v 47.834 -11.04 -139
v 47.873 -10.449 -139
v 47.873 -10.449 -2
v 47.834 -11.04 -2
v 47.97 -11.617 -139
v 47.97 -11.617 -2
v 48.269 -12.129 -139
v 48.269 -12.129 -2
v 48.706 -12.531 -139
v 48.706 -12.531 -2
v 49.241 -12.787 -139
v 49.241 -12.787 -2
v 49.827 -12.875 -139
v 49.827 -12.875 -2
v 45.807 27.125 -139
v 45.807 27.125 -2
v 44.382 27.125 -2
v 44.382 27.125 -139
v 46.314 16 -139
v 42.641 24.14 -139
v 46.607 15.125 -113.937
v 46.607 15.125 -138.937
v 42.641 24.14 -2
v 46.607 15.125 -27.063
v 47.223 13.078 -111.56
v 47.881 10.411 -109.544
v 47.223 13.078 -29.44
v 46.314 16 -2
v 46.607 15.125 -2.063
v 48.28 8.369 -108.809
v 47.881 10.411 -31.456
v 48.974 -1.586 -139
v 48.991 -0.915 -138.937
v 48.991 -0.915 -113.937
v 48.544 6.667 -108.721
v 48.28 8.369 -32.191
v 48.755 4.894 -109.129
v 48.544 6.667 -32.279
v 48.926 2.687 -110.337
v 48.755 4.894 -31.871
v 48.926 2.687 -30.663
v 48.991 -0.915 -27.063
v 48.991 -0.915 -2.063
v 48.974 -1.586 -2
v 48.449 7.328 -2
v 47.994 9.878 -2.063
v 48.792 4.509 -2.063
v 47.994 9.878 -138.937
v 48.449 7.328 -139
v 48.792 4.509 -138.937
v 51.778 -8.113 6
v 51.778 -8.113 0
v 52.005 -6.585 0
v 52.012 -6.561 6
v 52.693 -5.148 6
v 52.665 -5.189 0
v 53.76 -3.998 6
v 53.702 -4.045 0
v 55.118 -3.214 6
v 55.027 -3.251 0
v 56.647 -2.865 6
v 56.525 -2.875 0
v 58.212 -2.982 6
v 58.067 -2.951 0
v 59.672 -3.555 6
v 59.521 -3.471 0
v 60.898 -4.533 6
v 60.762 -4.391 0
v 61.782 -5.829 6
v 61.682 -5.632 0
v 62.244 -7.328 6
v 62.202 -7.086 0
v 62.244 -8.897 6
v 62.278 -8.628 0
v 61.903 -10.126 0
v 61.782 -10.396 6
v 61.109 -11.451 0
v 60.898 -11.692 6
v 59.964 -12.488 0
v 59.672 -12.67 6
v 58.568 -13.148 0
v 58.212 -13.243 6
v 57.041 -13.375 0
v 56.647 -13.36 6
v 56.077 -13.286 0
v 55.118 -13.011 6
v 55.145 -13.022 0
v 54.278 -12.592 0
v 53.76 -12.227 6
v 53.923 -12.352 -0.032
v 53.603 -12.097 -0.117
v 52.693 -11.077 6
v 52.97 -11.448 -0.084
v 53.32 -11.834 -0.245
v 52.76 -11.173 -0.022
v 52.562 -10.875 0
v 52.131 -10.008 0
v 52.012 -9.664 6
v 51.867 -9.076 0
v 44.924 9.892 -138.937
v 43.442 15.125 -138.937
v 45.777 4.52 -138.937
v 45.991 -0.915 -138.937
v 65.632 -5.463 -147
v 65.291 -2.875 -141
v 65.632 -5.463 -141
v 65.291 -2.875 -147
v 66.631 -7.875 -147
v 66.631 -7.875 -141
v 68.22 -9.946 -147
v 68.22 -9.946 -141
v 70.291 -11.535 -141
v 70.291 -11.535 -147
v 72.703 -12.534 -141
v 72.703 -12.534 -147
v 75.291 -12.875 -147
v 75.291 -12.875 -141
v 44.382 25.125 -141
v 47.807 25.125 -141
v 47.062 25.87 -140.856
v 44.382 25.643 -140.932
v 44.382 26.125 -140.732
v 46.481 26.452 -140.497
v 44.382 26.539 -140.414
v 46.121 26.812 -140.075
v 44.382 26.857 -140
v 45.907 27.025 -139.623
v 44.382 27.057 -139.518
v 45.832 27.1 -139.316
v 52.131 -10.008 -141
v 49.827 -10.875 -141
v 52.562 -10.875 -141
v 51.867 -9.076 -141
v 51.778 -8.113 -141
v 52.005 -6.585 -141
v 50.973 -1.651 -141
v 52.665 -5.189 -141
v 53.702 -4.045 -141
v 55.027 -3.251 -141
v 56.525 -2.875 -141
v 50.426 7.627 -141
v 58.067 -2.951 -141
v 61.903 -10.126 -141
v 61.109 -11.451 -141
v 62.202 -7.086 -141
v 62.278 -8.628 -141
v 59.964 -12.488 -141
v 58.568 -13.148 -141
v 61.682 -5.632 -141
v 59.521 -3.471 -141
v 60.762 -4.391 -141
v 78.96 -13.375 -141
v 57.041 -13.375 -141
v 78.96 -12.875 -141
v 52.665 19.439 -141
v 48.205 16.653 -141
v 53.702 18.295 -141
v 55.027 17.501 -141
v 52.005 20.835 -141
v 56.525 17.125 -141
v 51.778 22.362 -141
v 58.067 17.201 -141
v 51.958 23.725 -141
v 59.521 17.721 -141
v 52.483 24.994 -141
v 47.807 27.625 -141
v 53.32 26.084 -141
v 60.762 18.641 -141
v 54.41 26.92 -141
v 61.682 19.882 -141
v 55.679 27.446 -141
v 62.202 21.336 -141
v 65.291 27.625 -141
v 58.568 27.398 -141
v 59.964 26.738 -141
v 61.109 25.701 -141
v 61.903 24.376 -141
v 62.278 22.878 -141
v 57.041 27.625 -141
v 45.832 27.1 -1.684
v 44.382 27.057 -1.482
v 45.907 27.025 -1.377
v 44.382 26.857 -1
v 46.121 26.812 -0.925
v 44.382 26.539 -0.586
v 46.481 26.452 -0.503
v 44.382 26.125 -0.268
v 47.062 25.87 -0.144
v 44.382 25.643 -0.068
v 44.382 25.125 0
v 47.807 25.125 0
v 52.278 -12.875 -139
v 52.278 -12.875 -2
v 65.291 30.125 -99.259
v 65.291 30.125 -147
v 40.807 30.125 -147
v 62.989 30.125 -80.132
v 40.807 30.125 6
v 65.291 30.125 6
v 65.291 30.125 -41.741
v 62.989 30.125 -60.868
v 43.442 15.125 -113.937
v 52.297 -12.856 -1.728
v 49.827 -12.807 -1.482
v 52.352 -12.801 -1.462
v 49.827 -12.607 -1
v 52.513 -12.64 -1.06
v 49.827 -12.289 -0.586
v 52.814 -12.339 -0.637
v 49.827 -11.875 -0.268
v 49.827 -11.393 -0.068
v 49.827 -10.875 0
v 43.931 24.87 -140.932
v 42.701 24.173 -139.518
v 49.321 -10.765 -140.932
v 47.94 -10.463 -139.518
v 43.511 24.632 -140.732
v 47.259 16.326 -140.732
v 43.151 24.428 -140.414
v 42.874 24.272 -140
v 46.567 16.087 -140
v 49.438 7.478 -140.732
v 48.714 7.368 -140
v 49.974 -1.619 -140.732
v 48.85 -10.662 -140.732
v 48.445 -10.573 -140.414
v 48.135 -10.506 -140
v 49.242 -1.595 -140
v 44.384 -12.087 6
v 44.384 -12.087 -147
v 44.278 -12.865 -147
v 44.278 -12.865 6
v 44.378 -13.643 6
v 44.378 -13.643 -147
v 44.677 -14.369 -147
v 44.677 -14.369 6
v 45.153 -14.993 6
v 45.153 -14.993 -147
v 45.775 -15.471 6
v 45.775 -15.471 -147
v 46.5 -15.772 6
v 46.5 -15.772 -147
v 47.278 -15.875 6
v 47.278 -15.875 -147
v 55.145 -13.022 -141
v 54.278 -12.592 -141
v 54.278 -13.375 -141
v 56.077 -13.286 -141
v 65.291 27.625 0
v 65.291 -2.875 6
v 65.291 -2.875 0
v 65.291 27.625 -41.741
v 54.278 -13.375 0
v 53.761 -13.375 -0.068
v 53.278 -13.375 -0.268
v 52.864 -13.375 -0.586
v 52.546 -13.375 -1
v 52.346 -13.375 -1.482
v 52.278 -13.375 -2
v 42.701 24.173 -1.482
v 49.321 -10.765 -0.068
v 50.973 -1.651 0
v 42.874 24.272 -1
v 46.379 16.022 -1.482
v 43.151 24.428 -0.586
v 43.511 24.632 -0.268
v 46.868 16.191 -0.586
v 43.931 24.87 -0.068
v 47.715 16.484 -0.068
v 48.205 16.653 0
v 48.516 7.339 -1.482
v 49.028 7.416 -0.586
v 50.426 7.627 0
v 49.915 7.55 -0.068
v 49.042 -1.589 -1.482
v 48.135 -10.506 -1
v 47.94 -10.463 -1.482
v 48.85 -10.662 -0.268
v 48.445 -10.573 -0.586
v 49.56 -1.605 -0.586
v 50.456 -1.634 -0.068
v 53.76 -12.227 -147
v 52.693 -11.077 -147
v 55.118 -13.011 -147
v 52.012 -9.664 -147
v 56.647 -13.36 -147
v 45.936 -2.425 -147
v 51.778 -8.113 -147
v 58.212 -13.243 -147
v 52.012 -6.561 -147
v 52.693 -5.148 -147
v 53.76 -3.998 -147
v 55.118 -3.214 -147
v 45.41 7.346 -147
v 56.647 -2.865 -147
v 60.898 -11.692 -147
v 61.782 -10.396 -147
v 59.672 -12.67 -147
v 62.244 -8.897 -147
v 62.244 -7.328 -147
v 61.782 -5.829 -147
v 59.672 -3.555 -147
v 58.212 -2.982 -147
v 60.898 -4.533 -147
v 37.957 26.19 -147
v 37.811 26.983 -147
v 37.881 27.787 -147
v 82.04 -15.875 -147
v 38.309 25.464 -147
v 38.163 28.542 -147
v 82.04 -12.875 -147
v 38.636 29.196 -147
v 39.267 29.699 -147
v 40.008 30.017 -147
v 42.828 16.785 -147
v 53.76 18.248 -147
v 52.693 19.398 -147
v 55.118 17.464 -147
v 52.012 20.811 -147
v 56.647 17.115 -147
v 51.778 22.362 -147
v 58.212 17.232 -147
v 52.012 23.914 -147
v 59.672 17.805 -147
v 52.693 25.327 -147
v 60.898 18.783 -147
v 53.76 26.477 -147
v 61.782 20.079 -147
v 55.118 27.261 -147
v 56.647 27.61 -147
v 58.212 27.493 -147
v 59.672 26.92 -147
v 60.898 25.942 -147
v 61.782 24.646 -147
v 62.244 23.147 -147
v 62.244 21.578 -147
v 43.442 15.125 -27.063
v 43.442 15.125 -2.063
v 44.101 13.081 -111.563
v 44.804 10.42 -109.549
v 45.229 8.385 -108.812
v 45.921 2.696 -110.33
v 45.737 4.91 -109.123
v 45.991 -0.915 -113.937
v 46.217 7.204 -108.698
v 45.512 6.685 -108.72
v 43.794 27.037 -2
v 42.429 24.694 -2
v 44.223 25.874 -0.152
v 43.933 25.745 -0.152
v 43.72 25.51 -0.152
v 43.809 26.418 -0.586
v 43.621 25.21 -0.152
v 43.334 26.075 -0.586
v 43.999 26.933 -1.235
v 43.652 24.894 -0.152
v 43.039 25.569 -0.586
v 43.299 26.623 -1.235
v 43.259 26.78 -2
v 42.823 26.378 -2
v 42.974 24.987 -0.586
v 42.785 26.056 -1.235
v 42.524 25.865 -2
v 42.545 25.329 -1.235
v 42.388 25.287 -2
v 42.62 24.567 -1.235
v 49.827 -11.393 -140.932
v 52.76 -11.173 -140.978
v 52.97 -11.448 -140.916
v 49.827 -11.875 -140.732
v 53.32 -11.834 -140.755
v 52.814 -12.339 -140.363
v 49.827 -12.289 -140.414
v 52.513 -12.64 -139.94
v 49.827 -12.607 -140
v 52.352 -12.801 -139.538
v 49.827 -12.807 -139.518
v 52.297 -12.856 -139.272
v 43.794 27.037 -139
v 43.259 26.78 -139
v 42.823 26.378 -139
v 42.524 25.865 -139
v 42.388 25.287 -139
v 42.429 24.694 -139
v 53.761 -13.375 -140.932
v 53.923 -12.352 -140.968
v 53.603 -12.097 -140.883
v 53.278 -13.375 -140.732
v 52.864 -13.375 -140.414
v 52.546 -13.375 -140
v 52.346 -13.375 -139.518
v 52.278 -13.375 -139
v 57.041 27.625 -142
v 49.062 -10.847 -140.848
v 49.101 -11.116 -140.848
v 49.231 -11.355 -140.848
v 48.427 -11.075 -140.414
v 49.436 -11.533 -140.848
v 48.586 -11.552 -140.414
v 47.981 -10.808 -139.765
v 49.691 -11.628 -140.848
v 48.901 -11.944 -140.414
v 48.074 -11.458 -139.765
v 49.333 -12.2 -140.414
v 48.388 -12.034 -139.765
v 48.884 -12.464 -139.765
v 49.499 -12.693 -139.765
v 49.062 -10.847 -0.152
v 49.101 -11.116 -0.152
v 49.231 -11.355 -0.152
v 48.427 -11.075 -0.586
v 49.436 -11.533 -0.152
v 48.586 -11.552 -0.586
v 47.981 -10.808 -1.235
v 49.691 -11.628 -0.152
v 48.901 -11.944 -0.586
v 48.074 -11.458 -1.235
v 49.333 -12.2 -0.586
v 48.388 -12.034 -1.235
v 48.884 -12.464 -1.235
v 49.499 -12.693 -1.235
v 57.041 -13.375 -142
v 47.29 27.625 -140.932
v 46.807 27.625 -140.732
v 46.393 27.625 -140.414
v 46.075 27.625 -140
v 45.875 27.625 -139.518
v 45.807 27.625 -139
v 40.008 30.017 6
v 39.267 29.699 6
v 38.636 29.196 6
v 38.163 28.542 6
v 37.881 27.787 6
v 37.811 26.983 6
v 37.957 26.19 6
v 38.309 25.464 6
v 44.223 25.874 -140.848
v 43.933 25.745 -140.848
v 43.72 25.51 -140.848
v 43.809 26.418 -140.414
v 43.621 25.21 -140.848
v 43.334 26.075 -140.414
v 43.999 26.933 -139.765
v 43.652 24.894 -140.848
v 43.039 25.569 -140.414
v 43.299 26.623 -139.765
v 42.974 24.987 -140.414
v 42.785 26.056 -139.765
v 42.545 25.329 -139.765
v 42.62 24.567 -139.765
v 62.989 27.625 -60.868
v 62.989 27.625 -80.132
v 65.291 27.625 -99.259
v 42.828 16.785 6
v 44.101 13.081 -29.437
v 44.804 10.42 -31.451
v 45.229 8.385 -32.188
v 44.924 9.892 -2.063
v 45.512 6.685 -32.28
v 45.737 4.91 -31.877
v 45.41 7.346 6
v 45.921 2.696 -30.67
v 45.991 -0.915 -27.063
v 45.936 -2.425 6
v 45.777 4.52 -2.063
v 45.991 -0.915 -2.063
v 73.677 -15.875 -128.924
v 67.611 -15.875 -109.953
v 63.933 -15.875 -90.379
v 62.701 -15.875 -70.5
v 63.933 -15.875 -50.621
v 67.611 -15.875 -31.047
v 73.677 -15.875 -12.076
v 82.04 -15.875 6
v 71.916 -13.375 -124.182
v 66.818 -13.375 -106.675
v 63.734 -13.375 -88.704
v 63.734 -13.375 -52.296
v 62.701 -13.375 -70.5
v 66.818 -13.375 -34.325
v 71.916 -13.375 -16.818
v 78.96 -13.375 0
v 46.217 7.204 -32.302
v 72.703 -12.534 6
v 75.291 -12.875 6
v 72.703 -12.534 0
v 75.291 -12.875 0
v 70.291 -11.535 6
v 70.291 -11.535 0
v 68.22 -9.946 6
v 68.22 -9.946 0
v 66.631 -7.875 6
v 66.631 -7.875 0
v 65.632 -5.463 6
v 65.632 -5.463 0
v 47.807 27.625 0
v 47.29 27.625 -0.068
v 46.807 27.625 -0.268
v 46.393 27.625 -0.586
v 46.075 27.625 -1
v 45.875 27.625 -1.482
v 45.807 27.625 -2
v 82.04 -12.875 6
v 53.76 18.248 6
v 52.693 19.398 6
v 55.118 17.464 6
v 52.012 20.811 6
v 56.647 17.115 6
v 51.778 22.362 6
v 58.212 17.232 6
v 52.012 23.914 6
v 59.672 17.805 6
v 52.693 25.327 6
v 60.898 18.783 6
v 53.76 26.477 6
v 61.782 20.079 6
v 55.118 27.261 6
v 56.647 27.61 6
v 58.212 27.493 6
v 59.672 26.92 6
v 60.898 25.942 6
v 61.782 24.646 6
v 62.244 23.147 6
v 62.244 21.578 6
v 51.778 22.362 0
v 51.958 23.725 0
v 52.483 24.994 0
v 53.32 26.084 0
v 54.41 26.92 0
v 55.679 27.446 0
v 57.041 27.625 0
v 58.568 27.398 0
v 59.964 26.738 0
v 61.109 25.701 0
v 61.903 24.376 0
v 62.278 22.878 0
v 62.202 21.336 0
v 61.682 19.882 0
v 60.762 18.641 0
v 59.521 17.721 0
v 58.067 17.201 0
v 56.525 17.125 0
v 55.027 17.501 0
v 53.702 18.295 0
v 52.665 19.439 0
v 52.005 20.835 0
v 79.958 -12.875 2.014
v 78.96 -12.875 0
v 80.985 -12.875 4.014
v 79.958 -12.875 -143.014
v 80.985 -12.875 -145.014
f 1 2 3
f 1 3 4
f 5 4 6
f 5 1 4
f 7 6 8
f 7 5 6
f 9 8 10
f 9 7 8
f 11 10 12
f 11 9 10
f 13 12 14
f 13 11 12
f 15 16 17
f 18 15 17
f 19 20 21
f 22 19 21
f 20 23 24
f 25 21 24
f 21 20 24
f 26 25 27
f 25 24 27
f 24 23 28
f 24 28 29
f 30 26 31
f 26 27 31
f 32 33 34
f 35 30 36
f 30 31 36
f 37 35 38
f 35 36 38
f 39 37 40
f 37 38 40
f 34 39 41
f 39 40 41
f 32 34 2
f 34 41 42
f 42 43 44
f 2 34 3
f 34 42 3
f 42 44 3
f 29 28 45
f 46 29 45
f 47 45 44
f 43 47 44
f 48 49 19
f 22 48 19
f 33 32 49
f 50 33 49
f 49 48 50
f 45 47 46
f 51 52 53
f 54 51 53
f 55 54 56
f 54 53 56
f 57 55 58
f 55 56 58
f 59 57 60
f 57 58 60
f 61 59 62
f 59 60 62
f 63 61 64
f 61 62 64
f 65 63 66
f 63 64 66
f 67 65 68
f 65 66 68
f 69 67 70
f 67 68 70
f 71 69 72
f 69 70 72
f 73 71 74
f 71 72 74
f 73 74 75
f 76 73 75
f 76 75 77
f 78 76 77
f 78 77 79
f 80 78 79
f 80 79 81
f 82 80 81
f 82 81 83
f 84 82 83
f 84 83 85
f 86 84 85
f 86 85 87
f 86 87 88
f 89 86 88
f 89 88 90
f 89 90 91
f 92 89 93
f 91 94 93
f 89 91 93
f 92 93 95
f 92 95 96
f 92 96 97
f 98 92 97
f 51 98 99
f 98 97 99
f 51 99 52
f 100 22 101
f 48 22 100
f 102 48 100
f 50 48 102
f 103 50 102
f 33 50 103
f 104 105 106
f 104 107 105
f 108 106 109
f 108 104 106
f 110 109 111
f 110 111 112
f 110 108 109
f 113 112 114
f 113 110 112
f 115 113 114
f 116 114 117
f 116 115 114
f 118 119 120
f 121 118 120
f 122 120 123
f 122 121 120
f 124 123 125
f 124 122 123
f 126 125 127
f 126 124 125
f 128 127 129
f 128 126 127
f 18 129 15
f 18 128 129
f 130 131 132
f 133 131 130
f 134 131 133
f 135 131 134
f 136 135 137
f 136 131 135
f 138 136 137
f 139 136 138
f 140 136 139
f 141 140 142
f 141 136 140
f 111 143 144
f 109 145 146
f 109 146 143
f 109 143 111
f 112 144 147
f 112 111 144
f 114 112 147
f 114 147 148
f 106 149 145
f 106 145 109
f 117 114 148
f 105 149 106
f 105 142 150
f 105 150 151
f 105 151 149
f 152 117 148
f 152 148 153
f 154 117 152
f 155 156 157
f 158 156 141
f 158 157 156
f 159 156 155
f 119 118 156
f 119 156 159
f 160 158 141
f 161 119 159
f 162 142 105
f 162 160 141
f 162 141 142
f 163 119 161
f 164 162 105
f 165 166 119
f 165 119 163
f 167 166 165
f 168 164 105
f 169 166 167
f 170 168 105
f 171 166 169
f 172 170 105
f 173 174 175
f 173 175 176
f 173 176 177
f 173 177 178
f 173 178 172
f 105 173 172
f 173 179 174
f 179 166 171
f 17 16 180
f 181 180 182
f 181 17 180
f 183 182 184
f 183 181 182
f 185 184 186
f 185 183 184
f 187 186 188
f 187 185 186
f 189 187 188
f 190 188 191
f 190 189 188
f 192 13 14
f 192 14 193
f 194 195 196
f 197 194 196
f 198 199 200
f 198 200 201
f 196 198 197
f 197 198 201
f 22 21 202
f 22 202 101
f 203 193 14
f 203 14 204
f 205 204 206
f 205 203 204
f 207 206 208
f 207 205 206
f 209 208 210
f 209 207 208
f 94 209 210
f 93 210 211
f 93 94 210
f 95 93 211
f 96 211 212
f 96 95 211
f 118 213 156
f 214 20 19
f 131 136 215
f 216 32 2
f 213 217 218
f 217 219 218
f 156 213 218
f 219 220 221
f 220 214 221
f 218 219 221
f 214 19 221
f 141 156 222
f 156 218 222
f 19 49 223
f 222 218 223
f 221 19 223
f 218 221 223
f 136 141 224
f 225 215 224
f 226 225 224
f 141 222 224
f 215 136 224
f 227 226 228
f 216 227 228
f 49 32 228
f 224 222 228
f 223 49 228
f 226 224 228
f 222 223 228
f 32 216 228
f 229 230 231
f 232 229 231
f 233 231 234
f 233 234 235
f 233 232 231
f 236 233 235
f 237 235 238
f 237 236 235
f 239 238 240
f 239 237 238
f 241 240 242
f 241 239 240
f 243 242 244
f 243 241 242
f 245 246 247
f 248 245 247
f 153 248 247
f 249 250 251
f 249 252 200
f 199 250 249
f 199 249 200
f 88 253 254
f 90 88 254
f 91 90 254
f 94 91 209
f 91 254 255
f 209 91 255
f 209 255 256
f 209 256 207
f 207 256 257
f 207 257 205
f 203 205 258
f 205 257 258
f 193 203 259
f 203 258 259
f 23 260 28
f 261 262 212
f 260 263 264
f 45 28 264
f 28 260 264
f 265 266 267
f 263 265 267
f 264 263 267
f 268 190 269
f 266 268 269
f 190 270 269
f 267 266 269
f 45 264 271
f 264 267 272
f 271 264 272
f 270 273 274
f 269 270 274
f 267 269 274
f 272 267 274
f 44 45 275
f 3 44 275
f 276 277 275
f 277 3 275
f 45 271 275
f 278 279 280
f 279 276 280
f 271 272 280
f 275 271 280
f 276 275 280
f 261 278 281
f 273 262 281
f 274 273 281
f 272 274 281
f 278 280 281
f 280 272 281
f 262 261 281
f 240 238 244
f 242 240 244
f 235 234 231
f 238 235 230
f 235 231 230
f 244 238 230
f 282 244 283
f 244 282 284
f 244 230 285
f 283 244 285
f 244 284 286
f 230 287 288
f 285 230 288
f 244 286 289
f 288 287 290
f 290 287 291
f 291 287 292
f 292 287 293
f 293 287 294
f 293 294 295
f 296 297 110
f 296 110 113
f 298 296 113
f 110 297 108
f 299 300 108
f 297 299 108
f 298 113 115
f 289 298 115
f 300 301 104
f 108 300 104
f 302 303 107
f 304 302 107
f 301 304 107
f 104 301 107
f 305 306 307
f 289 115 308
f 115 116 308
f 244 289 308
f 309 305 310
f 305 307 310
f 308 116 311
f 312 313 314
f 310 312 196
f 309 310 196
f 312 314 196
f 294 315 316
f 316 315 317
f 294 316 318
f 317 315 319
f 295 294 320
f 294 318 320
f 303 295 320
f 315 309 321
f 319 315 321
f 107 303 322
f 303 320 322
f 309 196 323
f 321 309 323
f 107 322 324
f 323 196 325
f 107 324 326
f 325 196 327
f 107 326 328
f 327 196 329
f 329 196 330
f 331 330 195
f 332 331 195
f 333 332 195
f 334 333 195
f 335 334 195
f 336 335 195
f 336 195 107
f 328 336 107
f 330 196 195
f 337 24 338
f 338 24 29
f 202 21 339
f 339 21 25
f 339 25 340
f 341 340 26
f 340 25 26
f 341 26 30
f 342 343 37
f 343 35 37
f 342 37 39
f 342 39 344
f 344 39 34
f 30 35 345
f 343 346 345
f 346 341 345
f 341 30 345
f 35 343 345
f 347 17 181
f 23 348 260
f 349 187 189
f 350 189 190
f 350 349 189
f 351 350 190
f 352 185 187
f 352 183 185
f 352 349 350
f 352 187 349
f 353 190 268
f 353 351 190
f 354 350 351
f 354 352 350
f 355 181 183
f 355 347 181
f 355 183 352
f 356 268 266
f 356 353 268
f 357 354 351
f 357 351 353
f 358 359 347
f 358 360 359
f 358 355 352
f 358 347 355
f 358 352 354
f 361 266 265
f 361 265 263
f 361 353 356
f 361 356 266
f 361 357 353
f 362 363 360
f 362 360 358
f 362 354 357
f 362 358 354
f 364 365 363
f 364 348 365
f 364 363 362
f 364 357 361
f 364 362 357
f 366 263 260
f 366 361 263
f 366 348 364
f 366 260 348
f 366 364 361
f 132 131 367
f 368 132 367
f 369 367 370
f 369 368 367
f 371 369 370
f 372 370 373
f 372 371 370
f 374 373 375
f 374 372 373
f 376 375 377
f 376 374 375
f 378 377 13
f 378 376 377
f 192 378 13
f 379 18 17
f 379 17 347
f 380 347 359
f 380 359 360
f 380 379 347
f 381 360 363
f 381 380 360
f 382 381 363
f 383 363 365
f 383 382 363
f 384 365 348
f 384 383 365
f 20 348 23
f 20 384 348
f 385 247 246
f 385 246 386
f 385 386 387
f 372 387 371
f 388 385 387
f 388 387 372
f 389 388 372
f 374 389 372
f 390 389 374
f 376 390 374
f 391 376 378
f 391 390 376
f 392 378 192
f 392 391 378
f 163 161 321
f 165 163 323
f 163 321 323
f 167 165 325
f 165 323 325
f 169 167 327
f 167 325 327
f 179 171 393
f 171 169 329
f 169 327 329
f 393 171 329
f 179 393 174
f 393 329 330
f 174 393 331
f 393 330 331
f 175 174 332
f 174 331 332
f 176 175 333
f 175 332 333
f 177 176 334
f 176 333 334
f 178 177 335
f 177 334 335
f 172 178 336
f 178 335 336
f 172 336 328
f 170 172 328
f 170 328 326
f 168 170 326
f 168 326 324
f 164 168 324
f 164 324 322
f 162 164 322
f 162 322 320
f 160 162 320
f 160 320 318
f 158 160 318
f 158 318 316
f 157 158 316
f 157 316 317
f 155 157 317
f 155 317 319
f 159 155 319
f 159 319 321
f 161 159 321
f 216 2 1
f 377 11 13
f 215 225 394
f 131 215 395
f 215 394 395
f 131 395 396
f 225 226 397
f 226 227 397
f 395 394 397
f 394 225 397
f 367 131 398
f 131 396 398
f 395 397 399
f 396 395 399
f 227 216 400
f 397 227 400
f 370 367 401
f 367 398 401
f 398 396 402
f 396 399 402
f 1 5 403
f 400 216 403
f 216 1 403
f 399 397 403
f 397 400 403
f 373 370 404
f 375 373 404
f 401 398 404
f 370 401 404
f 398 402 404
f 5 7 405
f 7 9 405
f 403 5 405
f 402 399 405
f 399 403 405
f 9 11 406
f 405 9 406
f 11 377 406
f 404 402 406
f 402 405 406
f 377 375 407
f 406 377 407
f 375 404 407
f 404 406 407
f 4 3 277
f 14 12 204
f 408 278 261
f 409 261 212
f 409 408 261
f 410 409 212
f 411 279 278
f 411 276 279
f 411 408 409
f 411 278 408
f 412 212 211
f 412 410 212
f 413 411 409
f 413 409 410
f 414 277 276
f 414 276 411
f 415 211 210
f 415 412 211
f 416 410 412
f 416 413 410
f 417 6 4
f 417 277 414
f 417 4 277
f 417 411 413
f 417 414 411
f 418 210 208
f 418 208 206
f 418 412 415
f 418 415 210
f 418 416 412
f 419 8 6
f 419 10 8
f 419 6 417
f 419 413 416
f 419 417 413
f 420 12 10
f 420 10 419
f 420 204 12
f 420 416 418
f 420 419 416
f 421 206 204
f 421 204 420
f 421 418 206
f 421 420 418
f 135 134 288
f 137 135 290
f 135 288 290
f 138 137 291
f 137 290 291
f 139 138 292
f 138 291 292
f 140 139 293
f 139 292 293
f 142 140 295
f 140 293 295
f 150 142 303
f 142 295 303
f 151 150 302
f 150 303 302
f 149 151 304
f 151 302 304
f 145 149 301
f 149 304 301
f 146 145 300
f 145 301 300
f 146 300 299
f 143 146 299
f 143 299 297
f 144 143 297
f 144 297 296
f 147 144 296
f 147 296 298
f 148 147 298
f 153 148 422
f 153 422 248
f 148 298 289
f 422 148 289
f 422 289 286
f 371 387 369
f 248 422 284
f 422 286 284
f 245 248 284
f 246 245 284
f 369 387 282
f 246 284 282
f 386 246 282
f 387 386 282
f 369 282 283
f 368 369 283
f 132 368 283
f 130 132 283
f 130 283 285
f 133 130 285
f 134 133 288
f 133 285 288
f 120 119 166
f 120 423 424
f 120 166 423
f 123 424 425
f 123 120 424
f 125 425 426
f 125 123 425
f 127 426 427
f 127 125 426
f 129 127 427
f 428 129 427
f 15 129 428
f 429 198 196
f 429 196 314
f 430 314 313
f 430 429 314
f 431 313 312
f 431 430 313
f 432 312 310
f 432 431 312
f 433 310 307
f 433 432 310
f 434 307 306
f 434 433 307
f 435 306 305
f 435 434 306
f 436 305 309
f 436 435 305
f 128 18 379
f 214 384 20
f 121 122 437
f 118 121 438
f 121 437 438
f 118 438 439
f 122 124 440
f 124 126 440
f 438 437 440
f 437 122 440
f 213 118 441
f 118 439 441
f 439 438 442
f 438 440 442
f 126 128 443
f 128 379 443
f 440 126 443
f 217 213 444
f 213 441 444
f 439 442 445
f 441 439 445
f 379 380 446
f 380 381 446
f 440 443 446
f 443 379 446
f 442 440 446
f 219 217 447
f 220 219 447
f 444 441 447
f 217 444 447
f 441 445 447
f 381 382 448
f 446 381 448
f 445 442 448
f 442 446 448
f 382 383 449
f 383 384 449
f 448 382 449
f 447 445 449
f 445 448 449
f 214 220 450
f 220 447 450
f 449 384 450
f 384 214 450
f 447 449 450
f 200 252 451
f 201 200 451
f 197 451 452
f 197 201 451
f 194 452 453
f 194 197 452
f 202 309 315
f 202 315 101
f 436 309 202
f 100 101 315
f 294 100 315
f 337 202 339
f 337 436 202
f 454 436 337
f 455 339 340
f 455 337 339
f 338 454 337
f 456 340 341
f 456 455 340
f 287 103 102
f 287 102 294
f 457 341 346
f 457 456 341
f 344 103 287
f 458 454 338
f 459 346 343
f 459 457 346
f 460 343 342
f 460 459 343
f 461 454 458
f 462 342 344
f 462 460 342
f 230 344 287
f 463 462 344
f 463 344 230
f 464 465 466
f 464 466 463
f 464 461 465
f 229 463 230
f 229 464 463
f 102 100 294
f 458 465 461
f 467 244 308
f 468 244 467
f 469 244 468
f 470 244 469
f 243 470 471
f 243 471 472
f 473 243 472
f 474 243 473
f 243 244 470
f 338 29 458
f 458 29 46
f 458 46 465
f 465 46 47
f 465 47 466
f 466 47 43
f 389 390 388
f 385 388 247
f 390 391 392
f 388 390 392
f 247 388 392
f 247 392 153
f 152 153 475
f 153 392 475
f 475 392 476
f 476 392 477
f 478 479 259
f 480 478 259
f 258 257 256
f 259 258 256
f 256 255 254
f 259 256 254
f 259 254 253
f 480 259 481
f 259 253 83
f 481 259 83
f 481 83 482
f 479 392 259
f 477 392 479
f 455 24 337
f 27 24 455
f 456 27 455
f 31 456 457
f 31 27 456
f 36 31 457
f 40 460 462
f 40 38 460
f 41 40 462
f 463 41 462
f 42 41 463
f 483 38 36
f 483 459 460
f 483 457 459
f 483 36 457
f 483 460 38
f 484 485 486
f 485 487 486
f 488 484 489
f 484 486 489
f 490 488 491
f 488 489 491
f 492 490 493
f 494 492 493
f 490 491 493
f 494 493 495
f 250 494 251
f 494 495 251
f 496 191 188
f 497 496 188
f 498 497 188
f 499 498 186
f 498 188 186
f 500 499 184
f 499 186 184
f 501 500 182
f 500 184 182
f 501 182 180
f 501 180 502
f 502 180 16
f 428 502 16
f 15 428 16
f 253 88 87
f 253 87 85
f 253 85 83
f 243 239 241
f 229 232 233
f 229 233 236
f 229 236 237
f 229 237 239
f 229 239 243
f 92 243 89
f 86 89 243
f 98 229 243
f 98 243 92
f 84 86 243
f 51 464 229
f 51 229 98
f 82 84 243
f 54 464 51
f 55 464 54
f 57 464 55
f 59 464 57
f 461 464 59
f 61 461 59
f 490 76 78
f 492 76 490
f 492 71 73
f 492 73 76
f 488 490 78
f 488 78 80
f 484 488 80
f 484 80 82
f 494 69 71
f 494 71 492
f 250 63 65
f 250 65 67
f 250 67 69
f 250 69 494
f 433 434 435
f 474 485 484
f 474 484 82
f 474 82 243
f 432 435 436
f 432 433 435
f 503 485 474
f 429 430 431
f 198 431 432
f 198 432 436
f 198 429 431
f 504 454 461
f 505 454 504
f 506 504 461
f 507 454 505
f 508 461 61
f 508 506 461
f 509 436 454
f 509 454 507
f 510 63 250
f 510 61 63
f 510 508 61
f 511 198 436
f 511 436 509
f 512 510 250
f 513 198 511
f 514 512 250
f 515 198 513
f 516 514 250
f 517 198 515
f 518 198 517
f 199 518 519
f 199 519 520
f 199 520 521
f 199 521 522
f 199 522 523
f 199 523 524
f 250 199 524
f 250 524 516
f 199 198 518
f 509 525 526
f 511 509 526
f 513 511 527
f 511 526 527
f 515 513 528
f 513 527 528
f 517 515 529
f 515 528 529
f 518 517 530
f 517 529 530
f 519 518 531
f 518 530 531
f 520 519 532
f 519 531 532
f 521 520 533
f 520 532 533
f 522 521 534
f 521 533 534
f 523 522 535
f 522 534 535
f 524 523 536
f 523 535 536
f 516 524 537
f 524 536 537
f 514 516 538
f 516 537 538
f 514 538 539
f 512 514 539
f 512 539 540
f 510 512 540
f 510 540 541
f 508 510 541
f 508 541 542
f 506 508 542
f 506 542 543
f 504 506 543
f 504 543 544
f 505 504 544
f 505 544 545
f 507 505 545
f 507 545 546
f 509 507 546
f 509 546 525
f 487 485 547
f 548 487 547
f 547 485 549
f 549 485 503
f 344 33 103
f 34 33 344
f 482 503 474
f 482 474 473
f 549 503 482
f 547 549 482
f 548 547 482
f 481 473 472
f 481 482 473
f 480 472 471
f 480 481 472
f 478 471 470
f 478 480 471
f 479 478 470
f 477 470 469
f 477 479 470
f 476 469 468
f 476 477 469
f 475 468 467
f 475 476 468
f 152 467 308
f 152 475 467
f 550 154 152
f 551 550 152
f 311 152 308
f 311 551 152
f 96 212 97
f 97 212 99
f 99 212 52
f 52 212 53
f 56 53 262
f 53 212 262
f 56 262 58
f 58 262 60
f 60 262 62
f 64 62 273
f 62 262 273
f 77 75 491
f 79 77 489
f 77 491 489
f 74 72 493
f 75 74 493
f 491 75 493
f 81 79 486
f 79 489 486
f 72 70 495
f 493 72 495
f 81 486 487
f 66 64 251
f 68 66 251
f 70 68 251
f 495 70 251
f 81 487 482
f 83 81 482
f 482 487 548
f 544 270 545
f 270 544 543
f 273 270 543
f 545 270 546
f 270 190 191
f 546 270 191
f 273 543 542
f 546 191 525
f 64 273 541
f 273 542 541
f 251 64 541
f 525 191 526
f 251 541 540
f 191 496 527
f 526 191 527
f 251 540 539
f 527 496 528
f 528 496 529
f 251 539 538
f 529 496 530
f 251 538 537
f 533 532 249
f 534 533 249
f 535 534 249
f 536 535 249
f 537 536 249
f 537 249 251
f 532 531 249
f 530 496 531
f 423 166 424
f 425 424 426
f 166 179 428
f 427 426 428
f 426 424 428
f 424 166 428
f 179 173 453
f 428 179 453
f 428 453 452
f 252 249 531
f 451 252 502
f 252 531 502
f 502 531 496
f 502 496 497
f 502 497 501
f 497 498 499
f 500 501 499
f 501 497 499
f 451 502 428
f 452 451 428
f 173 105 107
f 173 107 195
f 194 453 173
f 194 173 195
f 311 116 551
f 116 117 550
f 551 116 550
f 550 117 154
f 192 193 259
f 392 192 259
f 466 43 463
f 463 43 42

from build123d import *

# Parameters (mm, degrees)
SALIENTE_EXTRUIR1_DEPTH = 6
SALIENTE_EXTRUIR4_START = 141
SALIENTE_EXTRUIR4_DEPTH = 141
SALIENTE_EXTRUIR5_START = 6
SALIENTE_EXTRUIR5_DEPTH = 6
REDONDEO10_R            = 2
REDONDEO11_R            = 2
CROQUIS8_R              = 5.2625
CORTAR_EXTRUIR5_DEPTH   = 161
CORTAR_EXTRUIR4_DEPTH   = 157.438581273
CROQUIS10_W             = 37.37553938
CROQUIS10_H             = 2.5
SALIENTE_EXTRUIR6_DEPTH = 142
CROQUIS15_W             = 31.064336603
CROQUIS15_H             = 2.5
SALIENTE_EXTRUIR8_DEPTH = 148
CROQUIS16_R             = 1.5
CORTAR_EXTRUIR6_DEPTH   = 156
CORTAR_EXTRUIR7_DEPTH   = 64
CROQUIS19_W             = 16.749018002
CROQUIS19_H             = 43
CORTAR_EXTRUIR9_DEPTH   = 157
REDONDEO12_R            = 10


with BuildPart() as part:
    # Croquis1 → Saliente-Extruir1 (new body)
    with BuildSketch(Plane.XY):
        with BuildLine():
            Line((47.278265355, -15.875), (82.039783357, -15.875))
            Line((82.039783357, -15.875), (82.039783357, 30.125))
            Line((82.039783357, 30.125), (40.807283357, 30.125))
            ThreePointArc((40.807283357, 30.125), (38.163219926, 28.542366774), (38.308878254, 25.464285714))
            ThreePointArc((38.308878254, 25.464285714), (45.409629872, 7.346122436), (44.38367768, -12.086734694))
            ThreePointArc((44.38367768, -12.086734694), (44.89448727, -14.696428571), (47.278265355, -15.875))
        make_face()
    extrude(amount=SALIENTE_EXTRUIR1_DEPTH)

    # Croquis6 → Saliente-Extruir4 (add)
    with BuildSketch(Plane(origin=(0, 0, 0), x_dir=(-1, 0, 0), z_dir=(0, 0, -1)).offset(SALIENTE_EXTRUIR4_START)):
        with BuildLine():
            Line((-45.807283357, 27.125), (-40.807283357, 27.125))
            ThreePointArc((-40.807283357, 27.125), (-48.371127473, 7.825217377), (-47.278265355, -12.875))
            Line((-47.278265355, -12.875), (-52.278265355, -12.875))
            Line((-52.278265355, -12.875), (-52.278265355, -15.875))
            Line((-52.278265355, -15.875), (-47.278265355, -15.875))
            ThreePointArc((-47.278265355, -15.875), (-44.89448727, -14.696428571), (-44.38367768, -12.086734694))
            ThreePointArc((-44.38367768, -12.086734694), (-45.409629872, 7.346122436), (-38.308878254, 25.464285714))
            ThreePointArc((-38.308878254, 25.464285714), (-38.163219926, 28.542366774), (-40.807283357, 30.125))
            Line((-40.807283357, 30.125), (-45.807283357, 30.125))
            Line((-45.807283357, 30.125), (-45.807283357, 27.125))
        make_face()
    extrude(amount=-SALIENTE_EXTRUIR4_DEPTH)

    # Croquis7 → Saliente-Extruir5 (add)
    with BuildSketch(Plane(origin=(0, 0, -141), x_dir=(-1, 0, 0), z_dir=(0, 0, -1)).offset(SALIENTE_EXTRUIR5_START)):
        with BuildLine():
            Line((-82.039783357, 30.125), (-40.807283357, 30.125))
            ThreePointArc((-40.807283357, 30.125), (-38.163219926, 28.542366774), (-38.308878254, 25.464285714))
            ThreePointArc((-38.308878254, 25.464285714), (-45.409629872, 7.346122436), (-44.38367768, -12.086734694))
            ThreePointArc((-44.38367768, -12.086734694), (-44.89448727, -14.696428571), (-47.278265355, -15.875))
            Line((-47.278265355, -15.875), (-82.039783357, -15.875))
            Line((-82.039783357, -15.875), (-82.039783357, 30.125))
        make_face()
    extrude(amount=-SALIENTE_EXTRUIR5_DEPTH)

    # Redondeo10
    redondeo10_edges = [part.edges().sort_by_distance(p)[0] for p in [
        (43.307283357, 27.125, -141),
        (43.307283357, 27.125, 0),
        (49.778265355, -12.875, 0),
        (49.778265355, -12.875, -141),
        (40.807283357, 27.125, -70.5),
        (47.278265355, -12.875, -70.5),
        (48.371127473, 7.825217377, -141),
        (48.371127473, 7.825217377, 0),
    ]]
    fillet(redondeo10_edges, radius=REDONDEO10_R)

    # Redondeo11
    redondeo11_edges = [part.edges().sort_by_distance(p)[0] for p in [
        (45.807283357, 27.625, 0),
        (52.278265355, -13.375, 0),
        (52.278265355, -13.375, -141),
        (45.807283357, 27.625, -141),
    ]]
    fillet(redondeo11_edges, radius=REDONDEO11_R)

    # Croquis8 → Cortar-Extruir5 (cut)
    with BuildSketch(Plane(origin=(0, 0, -147), x_dir=(-1, 0, 0), z_dir=(0, 0, -1))):
        with Locations((-57.040765355, -8.1125)):
            Circle(CROQUIS8_R)
        with Locations((-57.040765355, 22.3625)):
            Circle(CROQUIS8_R)
    extrude(amount=-CORTAR_EXTRUIR5_DEPTH, mode=Mode.SUBTRACT)

    # Croquis9 → Cortar-Extruir4 (cut, through all)
    with BuildSketch(Plane(origin=(82.039783357, 0, 0), x_dir=(0, 0, -1), z_dir=(1, 0, 0))):
        with BuildLine():
            Line((138.937038998, 15.125), (138.937038998, -0.914712205))
            Line((138.937038998, -0.914712205), (113.937038998, -0.914712205))
            add(Edge.make_bspline(
                [(113.937038998, 15.125), (103.458760089, 7.301871649), (113.937038998, -0.914712205)],
                knots=[0, 0, 0, 1, 1, 1], degree=2))
            Line((113.937038998, 15.125), (138.937038998, 15.125))
        make_face()
        with BuildLine():
            Line((2.062961002, 15.125), (2.062961002, -0.914712205))
            Line((2.062961002, -0.914712205), (27.062961002, -0.914712205))
            add(Edge.make_bspline(
                [(27.062961002, 15.125), (37.541239911, 7.301871649), (27.062961002, -0.914712205)],
                knots=[0, 0, 0, 1, 1, 1], degree=2))
            Line((27.062961002, 15.125), (2.062961002, 15.125))
        make_face()
    extrude(amount=-CORTAR_EXTRUIR4_DEPTH, mode=Mode.SUBTRACT)

    # Croquis10 → Saliente-Extruir6 (add)
    with BuildSketch(Plane(origin=(0, 0, 0), x_dir=(-1, 0, 0), z_dir=(0, 0, -1))):
        with Locations((-63.352013667, 28.875)):
            Rectangle(CROQUIS10_W, CROQUIS10_H)
    extrude(amount=SALIENTE_EXTRUIR6_DEPTH)

    # Croquis15 → Saliente-Extruir8 (add)
    with BuildSketch(Plane.XY.offset(6)):
        with Locations((66.507615055, -14.625)):
            Rectangle(CROQUIS15_W, CROQUIS15_H)
    extrude(amount=-SALIENTE_EXTRUIR8_DEPTH)

    # Croquis16 → Cortar-Extruir6 (cut)
    with BuildSketch(Plane.XY.offset(6)):
        with Locations((69.039783357, 16.125)):
            Circle(CROQUIS16_R)
        with Locations((68.932075525, -1.717397604)):
            Circle(CROQUIS16_R)
    extrude(amount=-CORTAR_EXTRUIR6_DEPTH, mode=Mode.SUBTRACT)

    # Croquis18 → Cortar-Extruir7 (cut)
    with BuildSketch(Plane(origin=(0, 30.125, 0), x_dir=(1, 0, 0), z_dir=(0, 1, 0))):
        with BuildLine():
            Line((82.039783357, 147), (82.039783357, -6))
            ThreePointArc((82.039783357, -6), (62.701060719, 70.5), (82.039783357, 147))
        make_face()
    extrude(amount=-CORTAR_EXTRUIR7_DEPTH, mode=Mode.SUBTRACT)

    # Croquis19 → Cortar-Extruir9 (cut)
    with BuildSketch(Plane.XY.offset(6)):
        with Locations((73.665274356, 8.625)):
            Rectangle(CROQUIS19_W, CROQUIS19_H)
    extrude(amount=-CORTAR_EXTRUIR9_DEPTH, mode=Mode.SUBTRACT)

    # Redondeo12
    redondeo12_edges = [part.edges().sort_by_distance(p)[0] for p in [
        (65.290765355, -12.875, -144),
        (65.290765355, -12.875, 3),
    ]]
    fillet(redondeo12_edges, radius=REDONDEO12_R)


solid = part.part
